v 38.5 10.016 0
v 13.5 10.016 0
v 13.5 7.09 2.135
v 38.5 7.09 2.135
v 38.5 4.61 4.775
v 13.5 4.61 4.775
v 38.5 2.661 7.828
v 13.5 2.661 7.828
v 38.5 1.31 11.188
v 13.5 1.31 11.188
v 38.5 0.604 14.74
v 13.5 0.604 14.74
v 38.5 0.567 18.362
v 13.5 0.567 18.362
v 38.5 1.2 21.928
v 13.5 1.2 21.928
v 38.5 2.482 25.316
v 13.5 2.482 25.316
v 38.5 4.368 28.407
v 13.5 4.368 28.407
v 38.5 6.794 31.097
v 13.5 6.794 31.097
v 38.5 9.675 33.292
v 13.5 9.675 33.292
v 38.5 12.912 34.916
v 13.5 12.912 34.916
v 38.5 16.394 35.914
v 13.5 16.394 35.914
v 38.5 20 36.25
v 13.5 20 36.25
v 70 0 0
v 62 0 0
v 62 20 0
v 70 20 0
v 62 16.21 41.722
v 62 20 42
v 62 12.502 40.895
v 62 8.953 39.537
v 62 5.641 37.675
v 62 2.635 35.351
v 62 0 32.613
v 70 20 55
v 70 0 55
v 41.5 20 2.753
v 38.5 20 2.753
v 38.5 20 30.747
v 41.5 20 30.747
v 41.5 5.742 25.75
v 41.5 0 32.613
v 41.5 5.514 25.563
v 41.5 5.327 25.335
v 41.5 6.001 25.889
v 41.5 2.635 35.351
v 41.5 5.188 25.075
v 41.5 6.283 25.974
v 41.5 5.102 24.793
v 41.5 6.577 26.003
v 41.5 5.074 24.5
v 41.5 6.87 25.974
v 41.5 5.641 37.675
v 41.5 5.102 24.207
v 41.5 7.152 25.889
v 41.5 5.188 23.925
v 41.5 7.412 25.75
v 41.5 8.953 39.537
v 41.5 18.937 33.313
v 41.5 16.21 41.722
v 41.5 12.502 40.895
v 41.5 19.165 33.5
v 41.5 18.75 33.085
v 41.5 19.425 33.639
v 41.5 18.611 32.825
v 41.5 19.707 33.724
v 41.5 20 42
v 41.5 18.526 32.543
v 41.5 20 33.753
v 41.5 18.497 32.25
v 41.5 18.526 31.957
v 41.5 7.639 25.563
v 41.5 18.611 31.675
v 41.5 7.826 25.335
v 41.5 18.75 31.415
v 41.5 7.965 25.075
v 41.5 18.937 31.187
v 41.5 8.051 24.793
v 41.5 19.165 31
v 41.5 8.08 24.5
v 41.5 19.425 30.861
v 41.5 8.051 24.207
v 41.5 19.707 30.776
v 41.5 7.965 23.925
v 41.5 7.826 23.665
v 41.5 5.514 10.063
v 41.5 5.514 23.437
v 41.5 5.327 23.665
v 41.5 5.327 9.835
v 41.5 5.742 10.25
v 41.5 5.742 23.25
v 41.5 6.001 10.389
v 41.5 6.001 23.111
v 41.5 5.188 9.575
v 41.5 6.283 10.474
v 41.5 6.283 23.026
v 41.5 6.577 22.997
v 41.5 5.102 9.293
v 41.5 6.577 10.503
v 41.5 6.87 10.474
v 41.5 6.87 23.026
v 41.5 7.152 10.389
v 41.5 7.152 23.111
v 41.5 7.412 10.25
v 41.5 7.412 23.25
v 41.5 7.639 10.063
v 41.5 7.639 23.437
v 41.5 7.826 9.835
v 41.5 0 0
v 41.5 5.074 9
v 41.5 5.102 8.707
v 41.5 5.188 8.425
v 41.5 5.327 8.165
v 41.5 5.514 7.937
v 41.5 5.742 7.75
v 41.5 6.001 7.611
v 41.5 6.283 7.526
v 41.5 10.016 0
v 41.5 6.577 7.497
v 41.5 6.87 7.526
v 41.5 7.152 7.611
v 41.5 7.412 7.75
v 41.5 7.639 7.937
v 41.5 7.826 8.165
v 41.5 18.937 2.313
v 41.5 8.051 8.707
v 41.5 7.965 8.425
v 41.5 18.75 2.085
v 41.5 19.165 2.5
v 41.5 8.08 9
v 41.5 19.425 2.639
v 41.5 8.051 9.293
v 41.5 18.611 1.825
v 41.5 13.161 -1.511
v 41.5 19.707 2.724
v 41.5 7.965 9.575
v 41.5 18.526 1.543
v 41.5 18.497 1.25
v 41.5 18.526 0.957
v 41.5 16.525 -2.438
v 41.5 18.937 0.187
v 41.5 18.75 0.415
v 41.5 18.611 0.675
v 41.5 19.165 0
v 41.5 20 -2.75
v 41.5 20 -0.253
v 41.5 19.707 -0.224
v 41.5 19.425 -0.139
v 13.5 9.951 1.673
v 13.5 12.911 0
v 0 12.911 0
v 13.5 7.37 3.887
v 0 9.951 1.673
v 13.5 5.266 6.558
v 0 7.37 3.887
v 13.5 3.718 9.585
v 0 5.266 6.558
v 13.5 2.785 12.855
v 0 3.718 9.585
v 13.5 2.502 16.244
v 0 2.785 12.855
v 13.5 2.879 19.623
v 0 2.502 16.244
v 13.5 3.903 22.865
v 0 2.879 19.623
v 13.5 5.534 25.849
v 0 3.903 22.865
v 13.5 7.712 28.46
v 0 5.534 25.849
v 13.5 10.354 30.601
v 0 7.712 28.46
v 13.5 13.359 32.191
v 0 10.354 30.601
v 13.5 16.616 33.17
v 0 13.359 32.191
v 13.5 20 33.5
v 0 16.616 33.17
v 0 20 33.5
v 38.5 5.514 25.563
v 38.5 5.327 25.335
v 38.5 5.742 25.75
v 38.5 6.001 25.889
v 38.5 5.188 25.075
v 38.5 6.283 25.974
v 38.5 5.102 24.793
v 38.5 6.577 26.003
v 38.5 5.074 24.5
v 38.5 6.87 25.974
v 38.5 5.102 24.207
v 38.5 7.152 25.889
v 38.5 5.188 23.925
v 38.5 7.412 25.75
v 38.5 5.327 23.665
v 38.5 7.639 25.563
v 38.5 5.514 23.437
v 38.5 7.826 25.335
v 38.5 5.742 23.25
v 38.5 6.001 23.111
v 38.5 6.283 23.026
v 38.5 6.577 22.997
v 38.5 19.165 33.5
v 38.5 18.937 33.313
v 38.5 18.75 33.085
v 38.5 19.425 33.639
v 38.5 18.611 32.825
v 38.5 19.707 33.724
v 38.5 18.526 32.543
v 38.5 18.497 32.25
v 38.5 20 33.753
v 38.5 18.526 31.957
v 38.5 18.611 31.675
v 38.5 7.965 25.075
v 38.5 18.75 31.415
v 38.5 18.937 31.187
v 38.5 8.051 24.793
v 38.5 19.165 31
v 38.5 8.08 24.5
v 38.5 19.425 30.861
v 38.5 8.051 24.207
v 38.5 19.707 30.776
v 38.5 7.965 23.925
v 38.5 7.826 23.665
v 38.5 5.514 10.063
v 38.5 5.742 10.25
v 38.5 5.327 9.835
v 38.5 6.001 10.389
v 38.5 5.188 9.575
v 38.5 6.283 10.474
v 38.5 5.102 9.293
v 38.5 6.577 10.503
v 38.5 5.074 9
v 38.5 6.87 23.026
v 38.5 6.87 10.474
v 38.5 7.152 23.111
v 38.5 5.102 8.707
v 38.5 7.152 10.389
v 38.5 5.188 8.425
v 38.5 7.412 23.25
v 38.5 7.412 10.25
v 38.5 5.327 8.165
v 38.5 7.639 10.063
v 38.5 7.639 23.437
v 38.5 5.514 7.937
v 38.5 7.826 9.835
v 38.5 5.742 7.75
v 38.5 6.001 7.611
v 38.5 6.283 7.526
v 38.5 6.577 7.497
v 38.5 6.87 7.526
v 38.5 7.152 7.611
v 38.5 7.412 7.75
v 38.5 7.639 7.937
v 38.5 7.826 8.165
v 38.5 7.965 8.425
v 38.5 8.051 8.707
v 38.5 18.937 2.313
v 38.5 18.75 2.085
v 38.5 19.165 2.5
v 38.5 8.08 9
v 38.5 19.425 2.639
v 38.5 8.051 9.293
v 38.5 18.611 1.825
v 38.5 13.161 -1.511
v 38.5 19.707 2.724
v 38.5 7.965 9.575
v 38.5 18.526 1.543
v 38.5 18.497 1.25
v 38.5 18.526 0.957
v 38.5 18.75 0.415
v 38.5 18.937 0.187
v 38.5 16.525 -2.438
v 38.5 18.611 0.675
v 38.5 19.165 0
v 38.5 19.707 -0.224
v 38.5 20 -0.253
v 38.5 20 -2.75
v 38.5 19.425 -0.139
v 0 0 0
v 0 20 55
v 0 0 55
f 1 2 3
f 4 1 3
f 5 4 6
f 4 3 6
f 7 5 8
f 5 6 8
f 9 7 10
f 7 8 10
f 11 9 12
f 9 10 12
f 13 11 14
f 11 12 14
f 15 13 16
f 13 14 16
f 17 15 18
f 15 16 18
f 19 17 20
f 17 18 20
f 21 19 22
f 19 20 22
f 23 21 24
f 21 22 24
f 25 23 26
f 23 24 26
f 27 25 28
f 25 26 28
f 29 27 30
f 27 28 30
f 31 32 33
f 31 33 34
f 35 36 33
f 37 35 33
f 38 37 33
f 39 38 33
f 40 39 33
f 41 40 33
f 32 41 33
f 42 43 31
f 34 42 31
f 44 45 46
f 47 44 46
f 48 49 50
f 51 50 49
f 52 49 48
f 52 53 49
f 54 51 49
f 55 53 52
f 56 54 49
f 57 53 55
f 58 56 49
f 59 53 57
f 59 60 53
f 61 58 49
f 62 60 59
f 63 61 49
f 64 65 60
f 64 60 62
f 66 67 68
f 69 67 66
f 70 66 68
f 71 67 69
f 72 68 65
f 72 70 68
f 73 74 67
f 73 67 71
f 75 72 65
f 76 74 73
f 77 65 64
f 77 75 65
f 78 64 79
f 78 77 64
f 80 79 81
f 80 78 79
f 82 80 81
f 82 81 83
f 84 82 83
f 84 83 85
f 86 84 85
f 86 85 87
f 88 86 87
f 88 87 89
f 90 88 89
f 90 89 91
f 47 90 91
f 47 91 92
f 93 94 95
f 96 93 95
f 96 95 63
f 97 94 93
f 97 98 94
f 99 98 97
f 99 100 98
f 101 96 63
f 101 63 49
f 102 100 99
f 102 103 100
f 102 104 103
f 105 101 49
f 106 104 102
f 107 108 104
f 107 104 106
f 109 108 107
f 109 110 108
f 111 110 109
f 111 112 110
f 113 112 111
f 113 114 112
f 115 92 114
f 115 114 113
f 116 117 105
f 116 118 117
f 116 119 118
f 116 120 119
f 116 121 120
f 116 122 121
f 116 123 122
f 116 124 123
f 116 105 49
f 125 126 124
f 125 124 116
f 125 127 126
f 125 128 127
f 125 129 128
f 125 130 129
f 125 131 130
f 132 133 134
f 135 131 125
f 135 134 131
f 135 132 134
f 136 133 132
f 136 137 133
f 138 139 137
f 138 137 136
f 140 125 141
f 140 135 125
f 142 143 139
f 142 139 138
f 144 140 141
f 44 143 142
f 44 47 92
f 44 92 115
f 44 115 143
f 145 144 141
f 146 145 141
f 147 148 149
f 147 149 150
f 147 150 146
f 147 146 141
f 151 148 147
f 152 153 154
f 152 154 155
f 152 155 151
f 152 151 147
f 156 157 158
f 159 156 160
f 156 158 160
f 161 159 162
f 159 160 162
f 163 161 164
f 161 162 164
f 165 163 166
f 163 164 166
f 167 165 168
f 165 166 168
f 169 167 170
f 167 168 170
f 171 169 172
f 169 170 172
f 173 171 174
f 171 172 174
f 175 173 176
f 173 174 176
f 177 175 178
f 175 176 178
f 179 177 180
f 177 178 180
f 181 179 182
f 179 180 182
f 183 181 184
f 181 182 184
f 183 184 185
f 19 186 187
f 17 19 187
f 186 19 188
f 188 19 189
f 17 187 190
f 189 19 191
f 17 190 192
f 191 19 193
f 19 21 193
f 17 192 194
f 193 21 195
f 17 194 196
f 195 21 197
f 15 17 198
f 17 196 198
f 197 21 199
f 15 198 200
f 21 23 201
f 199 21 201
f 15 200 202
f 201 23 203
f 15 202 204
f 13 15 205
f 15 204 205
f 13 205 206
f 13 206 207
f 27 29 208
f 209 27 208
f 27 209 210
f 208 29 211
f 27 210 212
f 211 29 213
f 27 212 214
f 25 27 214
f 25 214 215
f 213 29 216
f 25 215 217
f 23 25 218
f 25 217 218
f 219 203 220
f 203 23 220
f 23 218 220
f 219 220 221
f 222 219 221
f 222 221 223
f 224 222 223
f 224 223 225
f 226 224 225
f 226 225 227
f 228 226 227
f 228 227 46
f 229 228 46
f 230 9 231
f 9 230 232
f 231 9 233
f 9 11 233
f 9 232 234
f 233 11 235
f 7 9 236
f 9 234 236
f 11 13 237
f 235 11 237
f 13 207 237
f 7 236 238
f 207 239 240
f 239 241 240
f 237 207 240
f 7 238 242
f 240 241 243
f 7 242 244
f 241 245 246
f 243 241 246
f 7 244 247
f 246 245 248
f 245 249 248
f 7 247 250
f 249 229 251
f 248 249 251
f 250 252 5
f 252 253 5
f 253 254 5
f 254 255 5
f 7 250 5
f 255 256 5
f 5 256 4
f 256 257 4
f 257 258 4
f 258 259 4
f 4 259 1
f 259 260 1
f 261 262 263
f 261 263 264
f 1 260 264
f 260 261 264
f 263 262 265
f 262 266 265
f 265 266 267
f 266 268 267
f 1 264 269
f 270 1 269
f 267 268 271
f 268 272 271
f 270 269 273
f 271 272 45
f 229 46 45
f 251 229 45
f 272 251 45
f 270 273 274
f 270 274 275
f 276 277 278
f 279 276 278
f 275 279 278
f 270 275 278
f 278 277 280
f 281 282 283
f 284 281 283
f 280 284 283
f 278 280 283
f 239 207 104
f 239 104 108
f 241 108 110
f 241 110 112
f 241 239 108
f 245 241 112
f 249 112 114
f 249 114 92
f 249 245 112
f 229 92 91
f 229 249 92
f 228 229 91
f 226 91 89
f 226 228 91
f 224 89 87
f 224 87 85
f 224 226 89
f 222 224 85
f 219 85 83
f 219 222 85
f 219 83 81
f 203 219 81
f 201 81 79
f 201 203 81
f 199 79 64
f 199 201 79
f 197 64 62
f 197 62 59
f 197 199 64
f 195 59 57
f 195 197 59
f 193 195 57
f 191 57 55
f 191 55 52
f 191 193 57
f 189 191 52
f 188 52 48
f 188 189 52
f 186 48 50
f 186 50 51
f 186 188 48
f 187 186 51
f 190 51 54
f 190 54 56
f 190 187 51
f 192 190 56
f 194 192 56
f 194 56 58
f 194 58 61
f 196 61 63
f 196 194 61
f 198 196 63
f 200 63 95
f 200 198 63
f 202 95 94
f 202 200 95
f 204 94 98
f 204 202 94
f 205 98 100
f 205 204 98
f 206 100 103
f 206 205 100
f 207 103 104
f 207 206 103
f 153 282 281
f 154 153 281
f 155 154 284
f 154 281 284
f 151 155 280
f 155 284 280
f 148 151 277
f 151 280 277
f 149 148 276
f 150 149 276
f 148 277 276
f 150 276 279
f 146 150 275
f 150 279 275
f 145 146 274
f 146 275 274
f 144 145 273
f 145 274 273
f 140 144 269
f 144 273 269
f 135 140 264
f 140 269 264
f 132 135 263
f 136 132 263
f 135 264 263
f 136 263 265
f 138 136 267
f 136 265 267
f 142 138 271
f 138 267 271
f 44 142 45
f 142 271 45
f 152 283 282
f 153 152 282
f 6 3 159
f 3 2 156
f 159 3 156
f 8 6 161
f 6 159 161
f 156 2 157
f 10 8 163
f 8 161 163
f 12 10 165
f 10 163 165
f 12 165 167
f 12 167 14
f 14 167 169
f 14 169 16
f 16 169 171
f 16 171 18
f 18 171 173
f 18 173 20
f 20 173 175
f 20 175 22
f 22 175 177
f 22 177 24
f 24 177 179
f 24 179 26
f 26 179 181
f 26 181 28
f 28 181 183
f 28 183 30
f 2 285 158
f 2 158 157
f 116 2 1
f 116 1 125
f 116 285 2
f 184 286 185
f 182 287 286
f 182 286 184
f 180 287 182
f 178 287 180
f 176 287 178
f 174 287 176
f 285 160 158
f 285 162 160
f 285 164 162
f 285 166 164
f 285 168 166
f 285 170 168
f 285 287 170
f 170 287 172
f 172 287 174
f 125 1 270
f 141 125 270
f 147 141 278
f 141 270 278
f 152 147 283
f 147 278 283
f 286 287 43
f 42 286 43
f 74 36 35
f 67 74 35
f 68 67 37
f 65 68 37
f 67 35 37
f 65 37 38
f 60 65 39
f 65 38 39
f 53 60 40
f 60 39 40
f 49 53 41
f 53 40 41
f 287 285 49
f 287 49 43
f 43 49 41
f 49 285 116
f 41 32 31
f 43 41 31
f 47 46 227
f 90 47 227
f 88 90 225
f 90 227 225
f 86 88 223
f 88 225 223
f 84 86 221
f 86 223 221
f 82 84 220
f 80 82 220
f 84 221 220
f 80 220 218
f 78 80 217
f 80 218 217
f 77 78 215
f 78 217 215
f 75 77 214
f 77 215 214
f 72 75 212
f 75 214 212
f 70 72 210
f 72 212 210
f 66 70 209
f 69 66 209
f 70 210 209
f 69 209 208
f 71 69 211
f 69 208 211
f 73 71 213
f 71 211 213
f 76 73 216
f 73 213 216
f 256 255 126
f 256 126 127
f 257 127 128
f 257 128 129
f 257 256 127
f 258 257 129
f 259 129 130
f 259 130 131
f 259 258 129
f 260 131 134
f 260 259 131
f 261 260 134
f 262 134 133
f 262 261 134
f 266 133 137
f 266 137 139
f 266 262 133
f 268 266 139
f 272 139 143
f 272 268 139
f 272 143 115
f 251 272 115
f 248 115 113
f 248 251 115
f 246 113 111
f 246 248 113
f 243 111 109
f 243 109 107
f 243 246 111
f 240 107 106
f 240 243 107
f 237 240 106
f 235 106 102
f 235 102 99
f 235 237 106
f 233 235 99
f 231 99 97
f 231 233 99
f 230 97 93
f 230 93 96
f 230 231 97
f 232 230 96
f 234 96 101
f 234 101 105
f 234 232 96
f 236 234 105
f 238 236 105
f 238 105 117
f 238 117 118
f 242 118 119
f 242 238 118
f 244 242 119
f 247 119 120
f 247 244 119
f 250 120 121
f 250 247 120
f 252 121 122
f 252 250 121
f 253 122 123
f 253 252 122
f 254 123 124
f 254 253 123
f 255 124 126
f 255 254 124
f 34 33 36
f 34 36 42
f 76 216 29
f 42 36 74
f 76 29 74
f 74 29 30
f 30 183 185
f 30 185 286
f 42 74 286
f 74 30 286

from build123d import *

# Parameters (mm, degrees)
SKETCH1_W           = 70
SKETCH1_H           = 55
BOSS_EXTRUDE1_DEPTH = 20
SKETCH2_R           = 26
CUT_EXTRUDE1_DEPTH  = 20.5
SKETCH3_R           = 17.5
CUT_EXTRUDE2_DEPTH  = 13.5
SKETCH5_R           = 19.5
CUT_EXTRUDE3_DEPTH  = 28
SKETCH6_R           = 1.503081696
BOSS_EXTRUDE2_DEPTH = 3


with BuildPart() as part:
    # Sketch1 → Boss-Extrude1 (new body)
    with BuildSketch(Plane(origin=(0, 0, 0), x_dir=(1, 0, 0), z_dir=(0, 1, 0))):
        with Locations((35, -27.5)):
            Rectangle(SKETCH1_W, SKETCH1_H)
    extrude(amount=BOSS_EXTRUDE1_DEPTH)

    # Sketch2 → Cut-Extrude1 (cut)
    with BuildSketch(Plane(origin=(62, 0, 0), x_dir=(0, 0, -1), z_dir=(1, 0, 0))):
        with Locations((-16, 20)):
            Circle(SKETCH2_R)
    extrude(amount=-CUT_EXTRUDE1_DEPTH, mode=Mode.SUBTRACT)

    # Sketch3 → Cut-Extrude2 (cut)
    with BuildSketch(Plane.ZY):
        with Locations((16, 20)):
            Circle(SKETCH3_R)
    extrude(amount=-CUT_EXTRUDE2_DEPTH, mode=Mode.SUBTRACT)

    # Sketch5 → Cut-Extrude3 (cut)
    with BuildSketch(Plane.ZY.offset(-13.5)):
        with Locations((16.75, 20)):
            Circle(SKETCH5_R)
    extrude(amount=-CUT_EXTRUDE3_DEPTH, mode=Mode.SUBTRACT)

    # Sketch6 → Boss-Extrude2 (add)
    with BuildSketch(Plane(origin=(38.5, 0, 0), x_dir=(0, 0, -1), z_dir=(1, 0, 0))):
        with BuildLine():
            Line((2.75, 20), (0.253081696, 20))
            ThreePointArc((0.253081696, 20), (-1.25, 18.496918304), (-2.753081696, 20))
            Line((-2.753081696, 20), (-30.746918304, 20))
            ThreePointArc((-30.746918304, 20), (-32.25, 18.496918304), (-33.753081696, 20))
            Line((-33.753081696, 20), (-36.25, 20))
            ThreePointArc((-36.25, 20), (-16.75, 0.5), (2.75, 20))
        make_face()
        with Locations((-9, 6.576606241)):
            Circle(SKETCH6_R, mode=Mode.SUBTRACT)
        with Locations((-24.5, 6.576606241)):
            Circle(SKETCH6_R, mode=Mode.SUBTRACT)
    extrude(amount=BOSS_EXTRUDE2_DEPTH)


solid = part.part
